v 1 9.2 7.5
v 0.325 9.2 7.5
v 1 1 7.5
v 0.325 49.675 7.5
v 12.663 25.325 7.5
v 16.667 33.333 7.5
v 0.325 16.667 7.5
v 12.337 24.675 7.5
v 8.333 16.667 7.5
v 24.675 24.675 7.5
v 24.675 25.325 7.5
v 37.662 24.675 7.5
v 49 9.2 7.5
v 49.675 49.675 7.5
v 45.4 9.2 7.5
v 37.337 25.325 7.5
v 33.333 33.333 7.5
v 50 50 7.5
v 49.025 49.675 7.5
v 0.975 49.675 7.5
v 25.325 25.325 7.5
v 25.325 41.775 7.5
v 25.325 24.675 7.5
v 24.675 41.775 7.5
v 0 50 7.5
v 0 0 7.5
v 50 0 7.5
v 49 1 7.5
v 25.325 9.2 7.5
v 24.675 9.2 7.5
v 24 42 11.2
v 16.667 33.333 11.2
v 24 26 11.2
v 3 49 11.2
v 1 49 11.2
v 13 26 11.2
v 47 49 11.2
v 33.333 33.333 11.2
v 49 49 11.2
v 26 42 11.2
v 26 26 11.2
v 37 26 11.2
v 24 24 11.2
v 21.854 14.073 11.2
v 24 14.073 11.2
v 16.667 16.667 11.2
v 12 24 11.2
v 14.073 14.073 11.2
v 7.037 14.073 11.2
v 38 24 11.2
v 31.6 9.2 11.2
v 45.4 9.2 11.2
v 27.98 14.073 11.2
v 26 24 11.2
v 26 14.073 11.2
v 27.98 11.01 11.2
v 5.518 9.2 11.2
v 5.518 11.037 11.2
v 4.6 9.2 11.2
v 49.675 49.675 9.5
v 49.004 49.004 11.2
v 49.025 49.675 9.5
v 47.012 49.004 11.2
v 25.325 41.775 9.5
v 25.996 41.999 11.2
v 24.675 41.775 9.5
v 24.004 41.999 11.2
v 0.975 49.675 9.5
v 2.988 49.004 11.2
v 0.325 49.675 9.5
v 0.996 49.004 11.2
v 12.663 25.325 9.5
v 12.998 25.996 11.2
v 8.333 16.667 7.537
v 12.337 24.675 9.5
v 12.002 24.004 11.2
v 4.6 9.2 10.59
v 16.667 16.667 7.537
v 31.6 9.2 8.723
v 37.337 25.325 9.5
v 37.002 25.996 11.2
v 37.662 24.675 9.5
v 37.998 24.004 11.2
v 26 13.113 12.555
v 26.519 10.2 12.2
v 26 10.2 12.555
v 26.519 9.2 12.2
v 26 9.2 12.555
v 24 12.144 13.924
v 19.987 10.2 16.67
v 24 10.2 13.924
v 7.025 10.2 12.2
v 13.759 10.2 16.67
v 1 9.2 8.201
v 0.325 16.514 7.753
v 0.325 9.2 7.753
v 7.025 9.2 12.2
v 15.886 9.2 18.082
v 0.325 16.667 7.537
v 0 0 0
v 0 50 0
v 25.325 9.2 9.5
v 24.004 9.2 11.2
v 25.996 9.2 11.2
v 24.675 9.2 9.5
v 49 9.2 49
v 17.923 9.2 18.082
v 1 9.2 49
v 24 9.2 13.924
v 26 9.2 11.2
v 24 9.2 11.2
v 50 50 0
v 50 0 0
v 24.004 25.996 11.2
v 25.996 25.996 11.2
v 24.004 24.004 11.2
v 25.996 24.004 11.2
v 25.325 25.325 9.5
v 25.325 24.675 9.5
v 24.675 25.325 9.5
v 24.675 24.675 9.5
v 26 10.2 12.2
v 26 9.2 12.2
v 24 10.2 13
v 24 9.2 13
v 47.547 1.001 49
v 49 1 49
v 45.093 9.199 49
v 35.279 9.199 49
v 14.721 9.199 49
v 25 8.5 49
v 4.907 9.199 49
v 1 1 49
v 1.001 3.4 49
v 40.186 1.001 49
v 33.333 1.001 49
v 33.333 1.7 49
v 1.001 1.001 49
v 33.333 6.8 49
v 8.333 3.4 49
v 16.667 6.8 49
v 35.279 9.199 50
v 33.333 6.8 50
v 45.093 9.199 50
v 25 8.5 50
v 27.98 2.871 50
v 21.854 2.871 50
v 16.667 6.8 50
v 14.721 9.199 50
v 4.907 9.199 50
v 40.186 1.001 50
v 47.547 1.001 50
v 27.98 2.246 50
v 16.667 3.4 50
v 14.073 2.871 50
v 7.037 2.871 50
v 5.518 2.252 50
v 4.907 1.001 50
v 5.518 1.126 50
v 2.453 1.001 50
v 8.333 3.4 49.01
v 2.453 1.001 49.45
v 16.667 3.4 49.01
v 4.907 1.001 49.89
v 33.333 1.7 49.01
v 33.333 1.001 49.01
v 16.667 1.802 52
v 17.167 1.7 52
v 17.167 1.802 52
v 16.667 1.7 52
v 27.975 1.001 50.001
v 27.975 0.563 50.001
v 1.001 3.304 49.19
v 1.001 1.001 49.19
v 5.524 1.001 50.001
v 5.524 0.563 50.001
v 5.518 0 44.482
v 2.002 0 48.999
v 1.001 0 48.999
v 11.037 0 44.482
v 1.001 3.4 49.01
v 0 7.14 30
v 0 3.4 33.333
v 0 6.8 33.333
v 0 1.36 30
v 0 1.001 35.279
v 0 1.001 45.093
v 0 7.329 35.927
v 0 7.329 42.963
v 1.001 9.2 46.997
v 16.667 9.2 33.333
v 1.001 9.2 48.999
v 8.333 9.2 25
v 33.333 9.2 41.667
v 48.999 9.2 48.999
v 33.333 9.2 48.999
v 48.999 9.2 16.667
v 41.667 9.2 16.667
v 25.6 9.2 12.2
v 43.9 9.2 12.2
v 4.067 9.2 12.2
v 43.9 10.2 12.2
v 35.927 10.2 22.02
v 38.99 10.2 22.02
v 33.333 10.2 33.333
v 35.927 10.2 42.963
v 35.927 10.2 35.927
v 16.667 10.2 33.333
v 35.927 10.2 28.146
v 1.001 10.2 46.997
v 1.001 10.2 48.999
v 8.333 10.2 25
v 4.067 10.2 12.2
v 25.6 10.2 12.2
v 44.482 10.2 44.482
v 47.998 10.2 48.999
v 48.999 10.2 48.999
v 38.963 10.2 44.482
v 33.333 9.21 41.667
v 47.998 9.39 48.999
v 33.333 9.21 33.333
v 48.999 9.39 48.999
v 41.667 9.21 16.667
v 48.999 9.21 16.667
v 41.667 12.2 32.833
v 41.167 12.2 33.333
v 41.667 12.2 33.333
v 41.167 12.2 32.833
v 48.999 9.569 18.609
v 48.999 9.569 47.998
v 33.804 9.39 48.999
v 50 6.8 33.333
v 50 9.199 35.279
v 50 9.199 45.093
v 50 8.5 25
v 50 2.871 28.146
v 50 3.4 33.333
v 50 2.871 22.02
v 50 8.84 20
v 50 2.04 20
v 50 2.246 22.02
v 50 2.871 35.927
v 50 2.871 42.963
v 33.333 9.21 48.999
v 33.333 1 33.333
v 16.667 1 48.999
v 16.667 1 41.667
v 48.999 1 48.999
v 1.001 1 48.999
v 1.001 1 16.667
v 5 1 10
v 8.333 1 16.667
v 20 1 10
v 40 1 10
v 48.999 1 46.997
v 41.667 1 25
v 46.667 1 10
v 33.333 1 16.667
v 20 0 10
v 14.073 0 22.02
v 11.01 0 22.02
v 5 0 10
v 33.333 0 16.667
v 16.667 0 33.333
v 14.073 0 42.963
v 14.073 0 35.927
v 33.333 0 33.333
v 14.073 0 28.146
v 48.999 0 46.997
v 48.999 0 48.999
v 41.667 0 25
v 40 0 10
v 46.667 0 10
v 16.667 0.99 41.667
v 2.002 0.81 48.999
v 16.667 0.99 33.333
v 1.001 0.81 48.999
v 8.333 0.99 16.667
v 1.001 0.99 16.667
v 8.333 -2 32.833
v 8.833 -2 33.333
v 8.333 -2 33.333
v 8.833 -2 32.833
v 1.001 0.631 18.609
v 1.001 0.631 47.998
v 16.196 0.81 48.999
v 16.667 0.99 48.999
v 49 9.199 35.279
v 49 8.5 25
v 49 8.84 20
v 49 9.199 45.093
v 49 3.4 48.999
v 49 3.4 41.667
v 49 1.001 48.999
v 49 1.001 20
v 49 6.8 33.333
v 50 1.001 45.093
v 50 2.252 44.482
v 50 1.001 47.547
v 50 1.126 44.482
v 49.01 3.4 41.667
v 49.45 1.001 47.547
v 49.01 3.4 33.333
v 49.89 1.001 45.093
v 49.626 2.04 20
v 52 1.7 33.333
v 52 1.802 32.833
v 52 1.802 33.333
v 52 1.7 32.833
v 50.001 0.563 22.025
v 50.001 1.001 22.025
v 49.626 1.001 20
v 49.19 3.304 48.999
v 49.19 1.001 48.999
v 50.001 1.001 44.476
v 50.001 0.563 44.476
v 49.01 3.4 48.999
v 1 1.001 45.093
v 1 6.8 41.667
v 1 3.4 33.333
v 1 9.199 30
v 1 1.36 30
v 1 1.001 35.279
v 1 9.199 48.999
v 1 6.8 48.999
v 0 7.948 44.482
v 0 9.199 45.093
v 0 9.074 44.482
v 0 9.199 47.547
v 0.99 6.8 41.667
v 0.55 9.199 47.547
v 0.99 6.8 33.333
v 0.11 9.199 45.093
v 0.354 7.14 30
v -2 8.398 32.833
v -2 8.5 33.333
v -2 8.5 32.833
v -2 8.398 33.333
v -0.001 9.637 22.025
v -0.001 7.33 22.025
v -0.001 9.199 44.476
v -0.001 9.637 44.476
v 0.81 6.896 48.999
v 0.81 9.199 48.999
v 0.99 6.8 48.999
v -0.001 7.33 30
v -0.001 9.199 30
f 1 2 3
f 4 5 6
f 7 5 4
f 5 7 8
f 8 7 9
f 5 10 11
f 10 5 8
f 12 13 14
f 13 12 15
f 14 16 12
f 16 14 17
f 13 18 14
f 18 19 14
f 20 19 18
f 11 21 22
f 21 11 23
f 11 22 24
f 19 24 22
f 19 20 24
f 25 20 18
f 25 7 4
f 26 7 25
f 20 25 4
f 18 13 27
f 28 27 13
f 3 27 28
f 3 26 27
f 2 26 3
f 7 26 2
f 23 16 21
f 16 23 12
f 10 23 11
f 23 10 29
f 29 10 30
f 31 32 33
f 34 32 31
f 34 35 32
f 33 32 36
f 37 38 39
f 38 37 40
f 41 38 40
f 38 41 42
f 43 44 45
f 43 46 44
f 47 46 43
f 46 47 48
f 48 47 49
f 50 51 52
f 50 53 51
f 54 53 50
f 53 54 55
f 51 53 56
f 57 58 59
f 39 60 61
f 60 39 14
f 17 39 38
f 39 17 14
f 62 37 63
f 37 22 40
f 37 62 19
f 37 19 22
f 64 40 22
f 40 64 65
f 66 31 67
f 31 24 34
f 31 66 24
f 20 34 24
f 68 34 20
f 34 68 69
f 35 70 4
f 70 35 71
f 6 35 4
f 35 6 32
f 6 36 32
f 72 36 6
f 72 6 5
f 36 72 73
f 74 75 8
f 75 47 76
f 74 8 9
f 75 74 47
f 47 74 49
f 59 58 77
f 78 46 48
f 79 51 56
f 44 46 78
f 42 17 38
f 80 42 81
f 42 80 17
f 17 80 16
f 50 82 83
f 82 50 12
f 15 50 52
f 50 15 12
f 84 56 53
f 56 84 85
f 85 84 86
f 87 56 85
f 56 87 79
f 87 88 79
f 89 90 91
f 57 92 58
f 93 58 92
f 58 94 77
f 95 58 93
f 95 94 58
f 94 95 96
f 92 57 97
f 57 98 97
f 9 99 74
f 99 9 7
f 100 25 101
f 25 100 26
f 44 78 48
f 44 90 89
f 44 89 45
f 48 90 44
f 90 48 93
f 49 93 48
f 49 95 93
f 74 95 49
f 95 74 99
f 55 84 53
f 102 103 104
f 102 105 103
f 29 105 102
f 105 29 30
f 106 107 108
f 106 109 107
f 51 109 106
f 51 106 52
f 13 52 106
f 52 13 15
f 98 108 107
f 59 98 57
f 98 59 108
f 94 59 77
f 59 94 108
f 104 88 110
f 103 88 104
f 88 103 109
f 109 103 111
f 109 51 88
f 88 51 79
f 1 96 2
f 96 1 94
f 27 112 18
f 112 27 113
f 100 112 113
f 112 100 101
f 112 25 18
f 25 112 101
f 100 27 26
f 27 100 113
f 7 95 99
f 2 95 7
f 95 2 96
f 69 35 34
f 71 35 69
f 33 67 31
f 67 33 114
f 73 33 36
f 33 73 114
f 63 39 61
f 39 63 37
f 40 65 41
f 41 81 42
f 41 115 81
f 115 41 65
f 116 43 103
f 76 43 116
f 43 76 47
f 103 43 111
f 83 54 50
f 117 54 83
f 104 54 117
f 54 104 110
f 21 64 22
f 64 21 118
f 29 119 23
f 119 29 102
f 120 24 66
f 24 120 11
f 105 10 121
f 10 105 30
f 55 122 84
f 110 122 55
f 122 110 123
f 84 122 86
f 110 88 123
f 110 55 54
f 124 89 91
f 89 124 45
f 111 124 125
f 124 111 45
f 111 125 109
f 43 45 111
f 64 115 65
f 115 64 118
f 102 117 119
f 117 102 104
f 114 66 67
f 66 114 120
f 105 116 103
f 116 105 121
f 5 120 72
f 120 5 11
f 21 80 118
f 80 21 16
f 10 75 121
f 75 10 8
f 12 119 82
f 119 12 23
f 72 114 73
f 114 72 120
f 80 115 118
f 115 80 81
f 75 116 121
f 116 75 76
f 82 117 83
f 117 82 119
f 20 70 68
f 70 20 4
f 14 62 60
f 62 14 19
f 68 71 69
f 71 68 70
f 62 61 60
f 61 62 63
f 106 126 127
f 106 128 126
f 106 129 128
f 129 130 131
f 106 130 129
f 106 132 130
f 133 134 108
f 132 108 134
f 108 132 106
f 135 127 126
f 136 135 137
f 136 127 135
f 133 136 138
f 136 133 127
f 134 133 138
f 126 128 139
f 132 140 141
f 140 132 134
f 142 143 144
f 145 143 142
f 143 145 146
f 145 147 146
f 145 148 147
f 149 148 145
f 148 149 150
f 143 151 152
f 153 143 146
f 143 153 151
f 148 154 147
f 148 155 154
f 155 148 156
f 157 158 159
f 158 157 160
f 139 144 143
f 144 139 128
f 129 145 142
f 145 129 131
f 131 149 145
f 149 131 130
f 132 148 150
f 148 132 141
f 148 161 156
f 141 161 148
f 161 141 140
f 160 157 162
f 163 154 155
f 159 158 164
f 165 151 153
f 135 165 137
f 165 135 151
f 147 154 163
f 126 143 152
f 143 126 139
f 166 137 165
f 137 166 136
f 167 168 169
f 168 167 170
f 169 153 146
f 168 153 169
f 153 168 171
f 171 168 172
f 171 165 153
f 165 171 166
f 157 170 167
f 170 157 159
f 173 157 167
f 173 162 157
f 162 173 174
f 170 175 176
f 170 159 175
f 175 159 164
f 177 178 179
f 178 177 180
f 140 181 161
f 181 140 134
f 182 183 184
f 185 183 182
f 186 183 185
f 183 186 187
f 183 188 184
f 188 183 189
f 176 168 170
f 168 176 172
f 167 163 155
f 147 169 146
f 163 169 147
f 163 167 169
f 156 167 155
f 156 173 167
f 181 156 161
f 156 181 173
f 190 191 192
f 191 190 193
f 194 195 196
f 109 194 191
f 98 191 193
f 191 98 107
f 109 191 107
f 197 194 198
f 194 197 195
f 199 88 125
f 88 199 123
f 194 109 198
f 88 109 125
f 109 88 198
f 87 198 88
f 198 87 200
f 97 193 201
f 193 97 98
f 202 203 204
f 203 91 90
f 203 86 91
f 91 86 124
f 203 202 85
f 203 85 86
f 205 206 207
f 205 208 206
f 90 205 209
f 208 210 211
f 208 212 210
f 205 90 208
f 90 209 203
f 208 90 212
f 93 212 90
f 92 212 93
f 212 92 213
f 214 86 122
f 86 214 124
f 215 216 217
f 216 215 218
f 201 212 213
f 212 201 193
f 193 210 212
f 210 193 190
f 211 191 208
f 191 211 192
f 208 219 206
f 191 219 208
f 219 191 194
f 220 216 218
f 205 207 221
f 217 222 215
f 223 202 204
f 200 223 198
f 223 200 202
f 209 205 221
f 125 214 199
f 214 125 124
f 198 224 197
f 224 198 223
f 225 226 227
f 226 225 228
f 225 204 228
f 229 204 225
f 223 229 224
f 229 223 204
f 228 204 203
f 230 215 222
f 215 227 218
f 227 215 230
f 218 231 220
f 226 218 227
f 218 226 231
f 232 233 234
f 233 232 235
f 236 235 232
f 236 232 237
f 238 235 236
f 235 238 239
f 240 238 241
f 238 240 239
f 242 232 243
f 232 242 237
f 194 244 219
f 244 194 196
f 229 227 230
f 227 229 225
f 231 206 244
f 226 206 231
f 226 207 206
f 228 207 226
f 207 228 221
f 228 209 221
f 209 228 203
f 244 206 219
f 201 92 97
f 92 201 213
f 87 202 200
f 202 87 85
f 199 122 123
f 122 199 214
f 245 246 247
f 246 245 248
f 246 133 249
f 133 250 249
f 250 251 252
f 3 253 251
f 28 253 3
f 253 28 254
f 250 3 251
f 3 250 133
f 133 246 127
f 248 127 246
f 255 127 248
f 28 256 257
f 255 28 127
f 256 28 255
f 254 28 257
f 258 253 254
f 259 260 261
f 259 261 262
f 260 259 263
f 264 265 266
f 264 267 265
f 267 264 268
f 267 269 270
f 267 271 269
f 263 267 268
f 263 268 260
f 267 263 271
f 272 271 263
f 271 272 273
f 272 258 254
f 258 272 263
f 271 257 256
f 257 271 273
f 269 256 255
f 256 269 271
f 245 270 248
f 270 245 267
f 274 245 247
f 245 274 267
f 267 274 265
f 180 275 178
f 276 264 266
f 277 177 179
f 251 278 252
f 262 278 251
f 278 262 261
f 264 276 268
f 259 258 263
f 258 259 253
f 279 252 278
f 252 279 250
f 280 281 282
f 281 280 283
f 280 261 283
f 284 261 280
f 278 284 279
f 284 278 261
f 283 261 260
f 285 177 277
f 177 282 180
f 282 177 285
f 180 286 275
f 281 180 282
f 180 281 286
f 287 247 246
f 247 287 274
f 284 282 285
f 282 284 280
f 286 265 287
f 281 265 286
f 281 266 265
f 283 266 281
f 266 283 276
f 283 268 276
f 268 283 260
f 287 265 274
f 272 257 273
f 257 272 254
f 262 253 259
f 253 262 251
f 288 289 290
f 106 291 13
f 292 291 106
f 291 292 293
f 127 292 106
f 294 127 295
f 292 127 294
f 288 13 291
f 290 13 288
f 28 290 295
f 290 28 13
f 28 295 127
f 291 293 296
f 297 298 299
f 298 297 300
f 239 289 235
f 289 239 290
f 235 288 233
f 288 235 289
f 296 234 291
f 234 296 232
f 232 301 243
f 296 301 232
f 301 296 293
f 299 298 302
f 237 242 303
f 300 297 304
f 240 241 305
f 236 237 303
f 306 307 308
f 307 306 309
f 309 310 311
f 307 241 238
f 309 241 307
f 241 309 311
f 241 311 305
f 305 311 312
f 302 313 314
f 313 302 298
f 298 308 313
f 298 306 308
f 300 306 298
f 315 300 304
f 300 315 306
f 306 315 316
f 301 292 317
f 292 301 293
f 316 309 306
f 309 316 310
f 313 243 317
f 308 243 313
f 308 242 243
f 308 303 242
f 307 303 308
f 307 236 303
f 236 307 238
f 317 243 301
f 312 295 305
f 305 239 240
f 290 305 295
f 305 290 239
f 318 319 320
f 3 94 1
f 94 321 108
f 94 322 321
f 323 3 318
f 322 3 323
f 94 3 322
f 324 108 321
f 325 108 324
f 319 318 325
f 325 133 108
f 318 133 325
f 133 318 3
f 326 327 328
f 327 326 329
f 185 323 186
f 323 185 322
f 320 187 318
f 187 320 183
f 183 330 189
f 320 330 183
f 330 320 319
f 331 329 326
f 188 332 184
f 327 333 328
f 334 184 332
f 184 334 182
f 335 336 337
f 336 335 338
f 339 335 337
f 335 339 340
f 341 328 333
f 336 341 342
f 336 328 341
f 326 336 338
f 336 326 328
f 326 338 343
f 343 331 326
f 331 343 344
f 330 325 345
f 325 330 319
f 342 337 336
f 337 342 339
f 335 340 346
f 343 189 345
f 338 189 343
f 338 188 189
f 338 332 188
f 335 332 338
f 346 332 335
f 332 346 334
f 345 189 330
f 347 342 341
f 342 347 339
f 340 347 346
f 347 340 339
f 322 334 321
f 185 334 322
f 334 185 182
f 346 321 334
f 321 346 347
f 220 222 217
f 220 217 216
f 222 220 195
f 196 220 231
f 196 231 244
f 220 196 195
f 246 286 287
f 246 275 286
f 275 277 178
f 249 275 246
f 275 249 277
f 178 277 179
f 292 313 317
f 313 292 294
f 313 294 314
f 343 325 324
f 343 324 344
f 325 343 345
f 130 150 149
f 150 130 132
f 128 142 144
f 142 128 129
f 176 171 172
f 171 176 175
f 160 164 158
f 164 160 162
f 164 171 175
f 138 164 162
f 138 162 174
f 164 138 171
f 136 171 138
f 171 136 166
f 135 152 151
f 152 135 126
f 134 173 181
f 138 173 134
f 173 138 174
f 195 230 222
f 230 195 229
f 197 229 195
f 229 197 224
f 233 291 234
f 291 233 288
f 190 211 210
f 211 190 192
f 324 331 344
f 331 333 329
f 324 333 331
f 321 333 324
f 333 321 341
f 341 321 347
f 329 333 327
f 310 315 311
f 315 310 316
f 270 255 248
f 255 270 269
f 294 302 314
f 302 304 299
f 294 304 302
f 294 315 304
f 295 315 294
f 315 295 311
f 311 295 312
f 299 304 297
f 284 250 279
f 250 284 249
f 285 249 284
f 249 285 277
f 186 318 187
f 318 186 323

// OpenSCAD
/**
 * These constants size OpenForge tiles. They are used as defaults in the modules.
 *
 * The constants are taken from examination of the OpenForge source code.
 */

// width of an openforge floor square.
OF_square = 25; // 25mm. Use 25.4 if you want them to be exactly an inch.
// height of am openforge wall, from 0 to the top of the texture 
OF_wall_height = 50; 
// height of the openforge base chunk
OF_base_height = 7.5;
// width of the groove between floor tiles
OF_groove_width = .65;
// thickness of an OF wall, including the thicknesses of the textures
OF_wall_thickness = 10.2;
// depth from the top of the base texture to the top of the base
OF_floor_texture_depth = 3.7;
// inset from the outer limit of the wall size to the base if the wall texture
OF_wall_texture_depth = 1;

// tickness of floor texture 
// the "smooth" pagage uses 2mm, other bits use 3.7 . 
// I think that what's hoing on is that the floor texture has a 
// main riser and an upper smaller bit 

// so I will generate a chamfer from the lower .65mm gap to the upper 2mm gap

OF_floorTexUpper = 3.7; // from openforge
OF_floorTexLower = 2; // from openforge

// gap between floor tiles, in theory
OF_floorGapLower = .65; // from openforge
OF_floorGapUpper = 2; // wall texture * 2


/**
 * This module builds a 2*2 openforge floor section.
 * A texture for the floor may be passed as a child node. If no texture is given, then a
 * blank 2mm high texture (same as openforge_smooth) will be used.
 *
 * Use the baseNegativeIndex to specify a child shape that is cut out of the base.
 * This shape is clipped to the base with a wall thickness given by baseWallThickness. 
 *
 * Use the baseTextureIndex to specify which child node is the base texture. 
 *
 * Openforge textures appear to be 3.7mm high, so size your textures to match that.
 *
 * The texture is positioned vertcally. This module assumes that the XY of the texture
 * match the floor xy. 
 *
 * Textures are not clipped vertically. This  means that by giving a base texture
 * with features extending above the 2mm mark, taller features may be included. The
 * overall height of a sourceforge wall is 25mm, but keep in mind that any base texture is
 * vertically translated by the base thickness (7.5mm)
 * 
 * The edges and grooves of the floor tile are subtratced from the texture. This means
 * that your texture should not run right up to the edge of the tile unless you 
 * disable the grooves.
 * 
 * The texture can be clipped to accomodate an OF_Wall piece. The cliping is specified
 * as an arry of wall thichnesses in NSEW order, where "south-west" is the origin
 *
 * The default measurements are taken from the openforge source, correct for 2*2 25mm blocks.
 */

module OF_Floor(
    floorXY = [OF_square*2, OF_square*2],
    containingZ = OF_wall_height, // used to incise the grooves
    baseHeight = OF_base_height,
    baseWallThickness = OF_square/10, // overrides the base negative texture 
    baseTextureIndex = -1, // <0 means no base texture
    baseNegativeIndex = -1,
    use_grooves = true,
    groove_width = OF_groove_width,
    floorBlocks = [2, 2],
    wallClip = [0, 0, 0, 0],
    floorTexLower = OF_floorTexLower,
    floorTexUpper = OF_floorTexUpper,
    floorGapLower = OF_floorGapLower,
    floorGapUpper = OF_floorGapUpper
) {
    // I'll make these into constants
    N = 0;
    S = 1;
    E = 2;
    W = 3;

  difference() {
      
      union() {
          // base 
          cube([floorXY[0], floorXY[1], baseHeight]);
          
          // base texture
          translate([0,0,baseHeight])
          difference() {
              if(baseTextureIndex < 0) {
                  cube([floorXY[0], floorXY[1], floorTexUpper]);
              }
              else {
                  children([baseTextureIndex]);
              }
              
              union() {
                  if(wallClip[N]>0) { // north
                      translate([0,floorXY[1]-wallClip[N],0])
                      cube([floorXY[0], wallClip[N], containingZ-baseHeight]);
                  }
                  if(wallClip[S]>0) { // south
                      cube([floorXY[0], wallClip[S], containingZ-baseHeight]);
                  }
                  if(wallClip[E]>0) { // east
                      translate([floorXY[0]-wallClip[E],0,0])
                      cube([wallClip[E], floorXY[1], containingZ-baseHeight]);
                  }
                  if(wallClip[W]>0) { // west
                      cube([wallClip[W], floorXY[1], containingZ-baseHeight]);
                  }
              }
          }
      }
      
      if(baseNegativeIndex >= 0) {
          intersection() {
            cube([floorXY[0], floorXY[1], baseHeight]);
            children(baseNegativeIndex);
          }
      }
      
      if(use_grooves) {
        translate([0,0,baseHeight]) {
          for(x=[0:floorBlocks[0]])
          translate([x * floorXY[0]/floorBlocks[0], 0, 0]) {
            translate([-floorGapLower/2,0,0])
            cube([floorGapLower, floorXY[1], containingZ-baseHeight]);
            translate([-floorGapUpper/2,0,floorTexUpper])
            cube([floorGapUpper, floorXY[1], containingZ-baseHeight-floorTexUpper]);

            // chamfer
            translate([0,floorXY[1],0])
            rotate(90,[1,0,0])
            linear_extrude(floorXY[1])
            polygon([
                [-floorGapLower/2, floorTexLower],
                [floorGapLower/2, floorTexLower],
                [floorGapUpper/2, floorTexUpper+.01],
                [-floorGapUpper/2, floorTexUpper+.01]
            ]);
          }
          for(y=[0:floorBlocks[1]])
            translate([0, y * floorXY[1]/floorBlocks[1], 0]) {
            translate([0, -floorGapLower/2, 0])
            cube([floorXY[0], floorGapLower, containingZ-baseHeight]);
            translate([0, -floorGapUpper/2, floorTexUpper])
            cube([floorXY[0], floorGapUpper, containingZ-baseHeight-floorTexUpper]);
            // chamfer
            rotate(90,[0,0,1])
            rotate(90,[1,0,0])
            linear_extrude(floorXY[0])
            polygon([
                [-floorGapLower/2, floorTexLower],
                [floorGapLower/2, floorTexLower],
                [floorGapUpper/2, floorTexUpper+.01],
                [-floorGapUpper/2, floorTexUpper+.01]
            ]);
          }
        }
      }
  } 

  // the base wall. This effectively clips the base negative texture

  difference() {
    cube([floorXY[0], floorXY[1], baseHeight]);
    translate([baseWallThickness,baseWallThickness,-baseWallThickness])
    cube([floorXY[0]-baseWallThickness*2, floorXY[1]-baseWallThickness*2, baseHeight]);
  }

  
}

/*
  the default parameters 

  an OF wall has an XYZ size given as a vector.
  The wall has north, south, east and west faces, a top, and a base height.
  Positive along the Y axis is north, and positive along the X axis is east.
  Various paramters for these walls are passed as vectors. These vectors are assumed to be
  in order NSEW.
  
  Each side of a wall may be flush or textured.
  Textures are treated as being INSET into the wall. This does not mean that they are 
  specified in the negative, just that textures are assumed to not protrude beyond where the 
  wall would be if it were flush.

  Each wide of a wall, if it is textured, may have the texture clipped at the base to 
  accomodate a floor. This is given as a measurment - each side may have its own clip height.

  Textures are specified as a child object.
  The z-direction of the texture becomes the relief - it will be rotated so as to point "out".
  The origin of the texture will become the top left point of the wall. This means that the 
  x-axis of the texture becomes the vertical axis of the wall. Think of them as bing "hung"
  from the wall.

  
  textures are assumed to be sized according to the size and height of the wall. If you 
  specifiy that the x domension of your wall is 50, it will be assumed that your texture is
  50 across.

  if adjacent corners are textured, then the texture on both will be clipped inwards by the
  texture depth. The textures are not resized to fit. This means that you dont get some weird
  intersection happenning at the corners.

  The default paramters for this module give a wall that is sized as a 25mm open forge wall
  two squares long, along the X axis, with a recess for a floor on the north side

*/
module OF_Wall(
  size = [OF_square*2, OF_wall_thickness, OF_wall_height],
  texture_depth = OF_wall_texture_depth,
  top_flush = false,
  wall_flush = [false, false, false, false],
  wall_base_clip = [0,0,0,0],
  top_flush = false,
  top_texture_index = -1,
  wall_texture_index = [-1, -1, -1, -1]
) 
{
    // I'll make these into constants
    N = 0;
    S = 1;
    E = 2;
    W = 3;
    
    // I'm getting zero-thickness artifacts, so I need to add a fudge factor
    // to the clipping cubes
    shave = texture_depth / 1000;
    shave1 = texture_depth + shave;
    shave2 = texture_depth + shave * 2;
    
    translate([
        wall_flush[W] ? 0 : texture_depth,
        wall_flush[N] ? 0 : texture_depth,
        0
    ])    
    
    cube([
        size[0] - (wall_flush[E] ? 0 : texture_depth)  - (wall_flush[W] ? 0 : texture_depth) ,
        size[1] - (wall_flush[N] ? 0 : texture_depth)  - (wall_flush[S] ? 0 : texture_depth) ,
        size[2] - (top_flush ? 0 : texture_depth)
    ]);
    
    difference() {
        union() {
            if(!top_flush) {
                translate([0,0,size[2] - texture_depth])
                if(top_texture_index >= 0) {
                    children(top_texture_index);
                }
                else {
                    cube([
                        size[0], size[1], texture_depth
                    ]);
                }
            }
            if(!wall_flush[N]) {
                translate([size[0],size[1]-texture_depth,size[2]])
                rotate(90, [0,0,1])
                rotate(90, [0,1,0])
                difference() {
                    if(wall_texture_index[N] >= 0) {
                        children(wall_texture_index[N]);
                    }
                    else {
                        cube([
                            size[2], size[0], texture_depth
                        ]);
                    }
                    if(wall_base_clip[N] > 0) {
                        translate([size[2]-wall_base_clip[N],0,-shave])
                        cube([wall_base_clip[N], size[0], shave2]); 
                    }
                }
            }
            if(!wall_flush[S]) {
                translate([0,texture_depth,size[2]])
                rotate(-90, [0,0,1])
                rotate(90, [0,1,0])
                difference() {
                    if(wall_texture_index[S] >= 0) {
                        children(wall_texture_index[S]);
                    }
                    else {
                        cube([
                            size[2], size[0], texture_depth
                        ]);
                    }
                    
                    if(wall_base_clip[S] > 0) {
                        translate([size[2]-wall_base_clip[S],0,-shave])
                        cube([wall_base_clip[S], size[0], shave2]); 
                    }
                }
            }
            if(!wall_flush[E]) {
                translate([size[0]-texture_depth,0,size[2]])
                rotate(90, [0,1,0])
                difference() {
                    if(wall_texture_index[E] >= 0) {
                        children(wall_texture_index[E]);
                    }
                    else {
                        cube([
                            size[2], size[1], texture_depth
                        ]);
                    }

                    if(wall_base_clip[E] > 0) {
                        translate([size[2]-wall_base_clip[E],0,-shave])
                        cube([wall_base_clip[E], size[1], shave2]); 
                    }
                }
            }
            if(!wall_flush[W]) {
                translate([texture_depth,size[1],size[2]])
                rotate(180, [0,0,1])
                rotate(90, [0,1,0])
                difference() {
                    if(wall_texture_index[W] >= 0) {
                        children(wall_texture_index[W]);
                    }
                    else {
                        cube([
                            size[2], size[1], texture_depth
                        ]);
                    }
                    if(wall_base_clip[W] > 0) {
                        translate([size[2]-wall_base_clip[W],0,-shave])
                        cube([wall_base_clip[W], size[1], shave2]); 
                    }
                }
            }
        }
        
        // and now for the seams between the textures
        
        if(!top_flush && !wall_flush[N]) {
            translate([0, size[1]-shave1, size[2]-shave1])
            cube([size[0], shave2, shave2]);
        }
        if(!top_flush && !wall_flush[S]) {
            translate([0, -shave, size[2]-shave1])
            cube([size[0], shave2, shave2]);
        }
        if(!top_flush && !wall_flush[E]) {
            translate([size[0]-shave1, 0, size[2]-shave1])
            cube([shave2, size[1], shave2]);
        }
        if(!top_flush && !wall_flush[W]) {
            translate([-shave, 0, size[2]-shave1])
            cube([shave2, size[1], shave2]);
        }
        
        if(!wall_flush[N] && !wall_flush[E]) {
           translate([size[0]-shave1,size[1]-shave1,0])
           cube([shave2,shave2,size[2]]);
        }
        if(!wall_flush[N] && !wall_flush[W]) {
           translate([-shave,size[1]-shave1,0])
           cube([shave2,shave2,size[2]]);
        }
        if(!wall_flush[S] && !wall_flush[E]) {
           translate([size[0]-shave1,-shave,0])
           cube([shave2,shave2,size[2]]);
        }
        if(!wall_flush[S] && !wall_flush[W]) {
           translate([-shave,-shave,0])
           cube([shave2,shave2,size[2]]);
        }
    }
}


// these test shapes are deliberately assymnetric
// and extend all the way to the corners, to help
// demonstrate where clipping happens
// the poky-out pyramid helps us confirm that the textures are 
// oriented correctly WRT in/out of the surface
// note that because our pryamid excceds the state texture height, the clipping
// of the texture at the corners doe not happen correctly. This is to be expected.
// if you use wall textures that extend in the z-direction beyond the surface of the wall,
// then caveat emptor.

module OF_testTexture() {
    linear_extrude(1)
    scale([1/3, 1/3, 1])
    polygon([[0,0],[1,1],[3,0],[2,2],[3,3],[1.5,2.5],[0,3],[1,2]]);
    
    hull() {
    translate([2/6,1/6,0]) cube([.01, .01, 3]);
    translate([0/3, 0/3, 0])
    cube([2/3,1/3,.01]);
    }
}

module OF_testFloorTexture() {
    scale([OF_square*2,OF_square*2,OF_floor_texture_depth]) OF_testTexture();
}

module OF_testWallTexture() {
    scale([OF_wall_height,OF_square*2,OF_wall_texture_depth]) OF_testTexture();
}

module OF_testEdgeTexture() {
    scale([OF_wall_height,OF_wall_thickness,OF_wall_texture_depth]) OF_testTexture();
}

OF_Floor(baseTextureIndex = 0, wallClip=[0,OF_wall_thickness - OF_wall_texture_depth,0,0]) {
    OF_testFloorTexture();
}

OF_Wall(wall_texture_index = [0, 0, 1, 1], top_texture_index=1
, wall_base_clip = [
    OF_base_height + OF_floor_texture_depth + OF_wall_texture_depth,
    
    10, 20, 30

  ]) {
    OF_testWallTexture();
    OF_testEdgeTexture();
}
